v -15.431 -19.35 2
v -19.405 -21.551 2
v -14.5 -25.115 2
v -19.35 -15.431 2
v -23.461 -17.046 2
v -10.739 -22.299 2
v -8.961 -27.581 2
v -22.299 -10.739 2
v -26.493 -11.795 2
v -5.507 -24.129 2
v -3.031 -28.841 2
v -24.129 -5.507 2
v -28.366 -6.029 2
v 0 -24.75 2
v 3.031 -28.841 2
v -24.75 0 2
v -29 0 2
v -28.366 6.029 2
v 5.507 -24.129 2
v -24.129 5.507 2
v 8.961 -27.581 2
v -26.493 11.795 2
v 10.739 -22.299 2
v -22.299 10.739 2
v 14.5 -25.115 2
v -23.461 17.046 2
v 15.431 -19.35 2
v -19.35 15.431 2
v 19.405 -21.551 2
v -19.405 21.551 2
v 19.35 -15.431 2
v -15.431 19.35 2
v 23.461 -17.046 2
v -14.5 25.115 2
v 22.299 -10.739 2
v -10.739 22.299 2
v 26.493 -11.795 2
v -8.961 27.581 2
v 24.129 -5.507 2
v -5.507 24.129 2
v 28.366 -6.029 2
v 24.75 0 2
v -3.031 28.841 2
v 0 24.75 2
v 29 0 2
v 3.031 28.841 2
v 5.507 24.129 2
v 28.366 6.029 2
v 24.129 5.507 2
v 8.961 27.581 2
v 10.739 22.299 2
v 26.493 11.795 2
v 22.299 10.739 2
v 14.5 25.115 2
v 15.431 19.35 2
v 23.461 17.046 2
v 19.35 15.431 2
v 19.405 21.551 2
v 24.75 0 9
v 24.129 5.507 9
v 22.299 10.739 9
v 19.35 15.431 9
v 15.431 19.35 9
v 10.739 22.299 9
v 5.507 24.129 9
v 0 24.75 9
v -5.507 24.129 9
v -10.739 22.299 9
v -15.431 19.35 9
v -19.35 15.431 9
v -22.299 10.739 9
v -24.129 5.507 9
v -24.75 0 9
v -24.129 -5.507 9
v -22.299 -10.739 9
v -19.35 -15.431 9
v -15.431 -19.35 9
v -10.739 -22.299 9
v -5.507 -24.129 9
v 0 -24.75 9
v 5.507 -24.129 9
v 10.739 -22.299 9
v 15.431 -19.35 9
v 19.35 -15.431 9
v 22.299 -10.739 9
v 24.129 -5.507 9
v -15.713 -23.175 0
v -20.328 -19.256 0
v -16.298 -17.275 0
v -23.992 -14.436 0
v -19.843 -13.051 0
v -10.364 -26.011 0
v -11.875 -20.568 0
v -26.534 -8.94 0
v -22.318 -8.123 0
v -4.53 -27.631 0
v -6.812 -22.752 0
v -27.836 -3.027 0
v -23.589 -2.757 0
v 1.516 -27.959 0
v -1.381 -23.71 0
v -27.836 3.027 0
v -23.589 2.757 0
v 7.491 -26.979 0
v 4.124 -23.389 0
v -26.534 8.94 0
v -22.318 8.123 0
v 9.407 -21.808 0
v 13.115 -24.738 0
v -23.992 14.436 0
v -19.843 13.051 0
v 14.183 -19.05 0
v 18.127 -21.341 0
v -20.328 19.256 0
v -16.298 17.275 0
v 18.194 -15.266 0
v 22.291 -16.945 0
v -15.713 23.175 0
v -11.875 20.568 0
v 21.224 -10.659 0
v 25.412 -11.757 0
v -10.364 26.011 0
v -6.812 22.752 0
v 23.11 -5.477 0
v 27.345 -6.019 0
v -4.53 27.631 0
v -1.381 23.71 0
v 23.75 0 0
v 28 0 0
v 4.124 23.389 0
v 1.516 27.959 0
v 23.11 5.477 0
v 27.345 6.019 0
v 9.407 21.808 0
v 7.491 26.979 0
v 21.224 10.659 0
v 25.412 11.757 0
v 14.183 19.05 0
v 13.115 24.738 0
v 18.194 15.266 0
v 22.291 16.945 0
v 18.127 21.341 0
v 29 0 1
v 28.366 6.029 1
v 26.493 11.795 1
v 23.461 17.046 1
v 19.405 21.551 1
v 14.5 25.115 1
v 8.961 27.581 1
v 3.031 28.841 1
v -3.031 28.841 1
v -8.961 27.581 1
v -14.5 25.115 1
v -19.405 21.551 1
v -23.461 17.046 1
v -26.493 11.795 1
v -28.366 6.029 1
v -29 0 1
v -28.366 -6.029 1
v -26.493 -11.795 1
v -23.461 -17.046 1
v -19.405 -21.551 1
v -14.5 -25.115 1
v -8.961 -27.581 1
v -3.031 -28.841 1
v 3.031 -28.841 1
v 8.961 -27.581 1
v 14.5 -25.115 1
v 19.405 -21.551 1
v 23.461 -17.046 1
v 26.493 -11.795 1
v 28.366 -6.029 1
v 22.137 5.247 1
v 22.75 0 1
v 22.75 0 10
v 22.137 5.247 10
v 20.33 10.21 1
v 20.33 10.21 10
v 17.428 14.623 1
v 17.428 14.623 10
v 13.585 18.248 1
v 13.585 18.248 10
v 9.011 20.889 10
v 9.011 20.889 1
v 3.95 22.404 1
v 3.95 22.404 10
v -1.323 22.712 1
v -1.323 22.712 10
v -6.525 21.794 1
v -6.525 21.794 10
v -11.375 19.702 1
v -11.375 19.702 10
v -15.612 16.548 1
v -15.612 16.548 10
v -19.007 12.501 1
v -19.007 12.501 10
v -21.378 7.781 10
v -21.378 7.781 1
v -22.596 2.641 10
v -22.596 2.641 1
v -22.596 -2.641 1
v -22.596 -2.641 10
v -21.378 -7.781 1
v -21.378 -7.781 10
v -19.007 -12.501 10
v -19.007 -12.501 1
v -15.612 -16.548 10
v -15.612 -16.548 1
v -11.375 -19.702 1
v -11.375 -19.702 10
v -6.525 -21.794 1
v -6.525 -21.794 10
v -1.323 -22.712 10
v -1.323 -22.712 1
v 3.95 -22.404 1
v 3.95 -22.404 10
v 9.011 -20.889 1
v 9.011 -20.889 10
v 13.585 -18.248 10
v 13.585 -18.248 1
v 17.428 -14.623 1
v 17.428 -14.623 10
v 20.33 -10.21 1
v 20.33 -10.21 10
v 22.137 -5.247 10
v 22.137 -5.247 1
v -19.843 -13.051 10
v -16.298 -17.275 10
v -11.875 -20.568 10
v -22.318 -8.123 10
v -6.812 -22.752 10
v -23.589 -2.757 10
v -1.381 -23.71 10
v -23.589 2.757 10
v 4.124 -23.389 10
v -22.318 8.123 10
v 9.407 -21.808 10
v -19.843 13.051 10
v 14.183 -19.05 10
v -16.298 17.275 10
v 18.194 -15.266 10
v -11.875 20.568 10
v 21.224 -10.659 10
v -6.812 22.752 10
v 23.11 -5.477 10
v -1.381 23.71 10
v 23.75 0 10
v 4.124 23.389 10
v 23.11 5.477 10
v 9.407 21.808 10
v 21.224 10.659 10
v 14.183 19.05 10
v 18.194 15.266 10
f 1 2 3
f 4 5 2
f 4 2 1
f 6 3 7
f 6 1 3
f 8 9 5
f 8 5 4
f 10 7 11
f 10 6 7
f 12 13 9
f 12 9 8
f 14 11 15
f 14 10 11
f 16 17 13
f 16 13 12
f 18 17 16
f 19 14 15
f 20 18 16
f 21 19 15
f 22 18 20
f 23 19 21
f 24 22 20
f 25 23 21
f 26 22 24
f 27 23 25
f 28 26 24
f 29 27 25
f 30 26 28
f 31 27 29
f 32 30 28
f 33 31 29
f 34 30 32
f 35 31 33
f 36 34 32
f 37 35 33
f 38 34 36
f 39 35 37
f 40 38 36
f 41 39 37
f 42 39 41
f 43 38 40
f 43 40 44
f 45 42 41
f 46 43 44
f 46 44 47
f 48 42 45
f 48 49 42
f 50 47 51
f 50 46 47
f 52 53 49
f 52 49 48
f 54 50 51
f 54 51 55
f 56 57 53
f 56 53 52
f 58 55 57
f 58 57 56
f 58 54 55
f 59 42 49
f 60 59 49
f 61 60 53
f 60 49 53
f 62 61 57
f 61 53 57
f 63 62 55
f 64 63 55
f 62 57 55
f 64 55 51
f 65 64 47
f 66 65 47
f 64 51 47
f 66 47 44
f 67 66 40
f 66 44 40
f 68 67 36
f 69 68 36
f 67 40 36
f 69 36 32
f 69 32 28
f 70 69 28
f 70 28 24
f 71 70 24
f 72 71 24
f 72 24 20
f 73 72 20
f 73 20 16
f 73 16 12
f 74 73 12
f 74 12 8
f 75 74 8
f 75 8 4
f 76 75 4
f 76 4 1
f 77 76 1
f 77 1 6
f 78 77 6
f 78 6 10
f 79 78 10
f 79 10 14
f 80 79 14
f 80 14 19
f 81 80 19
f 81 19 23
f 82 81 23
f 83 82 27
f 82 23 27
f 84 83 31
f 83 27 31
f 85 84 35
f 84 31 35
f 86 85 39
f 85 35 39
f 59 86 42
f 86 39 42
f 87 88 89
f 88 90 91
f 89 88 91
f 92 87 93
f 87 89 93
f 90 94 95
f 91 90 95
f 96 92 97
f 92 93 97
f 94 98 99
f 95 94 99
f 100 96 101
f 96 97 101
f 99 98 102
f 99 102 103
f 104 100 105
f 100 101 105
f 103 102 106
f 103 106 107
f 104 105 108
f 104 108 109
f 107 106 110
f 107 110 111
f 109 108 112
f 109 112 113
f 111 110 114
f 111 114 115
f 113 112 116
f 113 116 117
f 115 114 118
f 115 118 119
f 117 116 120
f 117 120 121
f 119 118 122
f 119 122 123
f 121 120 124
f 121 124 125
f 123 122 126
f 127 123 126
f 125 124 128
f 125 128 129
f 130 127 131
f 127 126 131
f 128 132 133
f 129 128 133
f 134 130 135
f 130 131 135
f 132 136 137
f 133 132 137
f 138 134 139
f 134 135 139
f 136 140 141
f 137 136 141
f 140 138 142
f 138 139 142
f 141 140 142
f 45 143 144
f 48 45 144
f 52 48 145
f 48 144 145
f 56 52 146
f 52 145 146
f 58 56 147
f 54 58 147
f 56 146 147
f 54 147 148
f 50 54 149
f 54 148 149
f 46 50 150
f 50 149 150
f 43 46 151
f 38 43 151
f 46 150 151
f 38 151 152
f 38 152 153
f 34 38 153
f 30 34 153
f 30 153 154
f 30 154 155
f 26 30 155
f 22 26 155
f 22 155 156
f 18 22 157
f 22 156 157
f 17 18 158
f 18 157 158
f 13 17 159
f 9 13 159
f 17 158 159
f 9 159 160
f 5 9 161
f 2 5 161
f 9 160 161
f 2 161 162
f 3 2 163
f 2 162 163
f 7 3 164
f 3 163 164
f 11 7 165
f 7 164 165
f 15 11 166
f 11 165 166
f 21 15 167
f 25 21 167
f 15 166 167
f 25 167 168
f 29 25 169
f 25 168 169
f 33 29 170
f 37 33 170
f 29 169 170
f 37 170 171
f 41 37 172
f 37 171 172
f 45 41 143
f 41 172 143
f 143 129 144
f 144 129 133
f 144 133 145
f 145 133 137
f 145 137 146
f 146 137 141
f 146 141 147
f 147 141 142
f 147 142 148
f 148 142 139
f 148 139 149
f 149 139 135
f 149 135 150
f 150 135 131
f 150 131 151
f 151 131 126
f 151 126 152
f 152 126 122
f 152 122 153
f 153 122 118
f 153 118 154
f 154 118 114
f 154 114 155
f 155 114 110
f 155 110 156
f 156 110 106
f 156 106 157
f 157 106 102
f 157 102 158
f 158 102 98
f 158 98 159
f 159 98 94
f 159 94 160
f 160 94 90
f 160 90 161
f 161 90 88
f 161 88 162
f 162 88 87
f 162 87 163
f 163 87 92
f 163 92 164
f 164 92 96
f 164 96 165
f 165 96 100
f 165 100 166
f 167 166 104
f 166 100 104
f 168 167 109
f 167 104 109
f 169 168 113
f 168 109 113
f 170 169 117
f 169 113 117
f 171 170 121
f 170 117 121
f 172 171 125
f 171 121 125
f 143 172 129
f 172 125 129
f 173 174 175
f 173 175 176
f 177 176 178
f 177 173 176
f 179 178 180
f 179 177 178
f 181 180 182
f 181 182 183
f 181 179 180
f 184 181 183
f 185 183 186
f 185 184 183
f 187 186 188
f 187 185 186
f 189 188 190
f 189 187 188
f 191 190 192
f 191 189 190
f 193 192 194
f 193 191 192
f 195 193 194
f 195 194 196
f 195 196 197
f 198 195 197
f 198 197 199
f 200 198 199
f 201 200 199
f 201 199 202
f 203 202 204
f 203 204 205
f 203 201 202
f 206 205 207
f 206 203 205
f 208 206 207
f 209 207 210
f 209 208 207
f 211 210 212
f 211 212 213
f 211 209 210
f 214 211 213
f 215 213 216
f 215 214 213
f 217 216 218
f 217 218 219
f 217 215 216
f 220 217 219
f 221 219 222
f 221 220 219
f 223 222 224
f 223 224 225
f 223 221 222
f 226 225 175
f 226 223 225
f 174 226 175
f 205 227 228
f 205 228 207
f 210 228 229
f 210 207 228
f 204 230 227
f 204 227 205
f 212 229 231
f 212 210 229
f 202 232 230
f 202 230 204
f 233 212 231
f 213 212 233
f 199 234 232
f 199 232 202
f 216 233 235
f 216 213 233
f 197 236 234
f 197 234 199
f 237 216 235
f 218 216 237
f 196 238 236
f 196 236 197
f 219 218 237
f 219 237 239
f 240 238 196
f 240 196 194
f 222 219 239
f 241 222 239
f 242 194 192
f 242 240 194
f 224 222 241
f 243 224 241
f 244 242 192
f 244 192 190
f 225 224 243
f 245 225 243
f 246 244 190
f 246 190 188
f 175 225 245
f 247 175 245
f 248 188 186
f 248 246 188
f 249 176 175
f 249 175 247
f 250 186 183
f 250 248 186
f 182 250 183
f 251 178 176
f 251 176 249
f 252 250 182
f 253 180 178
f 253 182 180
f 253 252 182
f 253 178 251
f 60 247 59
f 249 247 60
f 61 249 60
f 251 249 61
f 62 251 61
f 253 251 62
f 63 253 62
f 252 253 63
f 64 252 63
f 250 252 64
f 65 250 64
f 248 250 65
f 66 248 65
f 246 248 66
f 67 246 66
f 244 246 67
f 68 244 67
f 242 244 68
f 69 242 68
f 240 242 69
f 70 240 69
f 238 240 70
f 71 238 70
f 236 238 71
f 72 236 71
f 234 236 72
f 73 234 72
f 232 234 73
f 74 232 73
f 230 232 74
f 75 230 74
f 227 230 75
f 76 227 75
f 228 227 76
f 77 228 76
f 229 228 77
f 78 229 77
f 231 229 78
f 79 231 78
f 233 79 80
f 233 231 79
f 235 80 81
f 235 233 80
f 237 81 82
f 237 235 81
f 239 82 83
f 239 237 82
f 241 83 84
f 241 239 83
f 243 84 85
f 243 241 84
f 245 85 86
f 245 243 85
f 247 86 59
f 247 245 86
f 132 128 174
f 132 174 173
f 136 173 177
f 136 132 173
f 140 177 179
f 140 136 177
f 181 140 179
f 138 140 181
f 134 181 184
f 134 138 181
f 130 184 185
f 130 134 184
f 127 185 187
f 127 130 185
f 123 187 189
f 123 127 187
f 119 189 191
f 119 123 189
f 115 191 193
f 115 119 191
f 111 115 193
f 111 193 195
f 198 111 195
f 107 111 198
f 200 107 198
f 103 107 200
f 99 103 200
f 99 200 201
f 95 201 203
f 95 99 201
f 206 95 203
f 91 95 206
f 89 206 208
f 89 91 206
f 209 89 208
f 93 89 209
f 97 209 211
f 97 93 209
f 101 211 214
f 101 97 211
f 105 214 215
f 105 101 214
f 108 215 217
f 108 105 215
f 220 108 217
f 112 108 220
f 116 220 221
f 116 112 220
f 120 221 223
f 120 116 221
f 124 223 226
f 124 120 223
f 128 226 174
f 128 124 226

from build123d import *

# Parameters (mm, degrees)
F0_R     = 24.75
F0_R_2   = 22.75
F1_DEPTH = 10
F2_R     = 29
F2_R_2   = 22.75
F3_DEPTH = 2
F4_SIZE  = 1


with BuildPart() as f1:
    # F0 (on Top) → F1 (new body)
    with BuildSketch(Plane.XY):
        Circle(F0_R)
        Circle(F0_R_2, mode=Mode.SUBTRACT)
    extrude(amount=F1_DEPTH)

    # F2 (on Top) → F3 (join)
    with BuildSketch(Plane.XY):
        Circle(F2_R)
        Circle(F2_R_2, mode=Mode.SUBTRACT)
    extrude(amount=F3_DEPTH)

    # F4
    f4_edges = [f1.edges().sort_by_distance(p)[0] for p in [
        (-29, 0, 0),
        (-22.75, 0, 0),
        (-24.75, 0, 10),
    ]]
    chamfer(f4_edges, length=F4_SIZE)


solid = f1.part
